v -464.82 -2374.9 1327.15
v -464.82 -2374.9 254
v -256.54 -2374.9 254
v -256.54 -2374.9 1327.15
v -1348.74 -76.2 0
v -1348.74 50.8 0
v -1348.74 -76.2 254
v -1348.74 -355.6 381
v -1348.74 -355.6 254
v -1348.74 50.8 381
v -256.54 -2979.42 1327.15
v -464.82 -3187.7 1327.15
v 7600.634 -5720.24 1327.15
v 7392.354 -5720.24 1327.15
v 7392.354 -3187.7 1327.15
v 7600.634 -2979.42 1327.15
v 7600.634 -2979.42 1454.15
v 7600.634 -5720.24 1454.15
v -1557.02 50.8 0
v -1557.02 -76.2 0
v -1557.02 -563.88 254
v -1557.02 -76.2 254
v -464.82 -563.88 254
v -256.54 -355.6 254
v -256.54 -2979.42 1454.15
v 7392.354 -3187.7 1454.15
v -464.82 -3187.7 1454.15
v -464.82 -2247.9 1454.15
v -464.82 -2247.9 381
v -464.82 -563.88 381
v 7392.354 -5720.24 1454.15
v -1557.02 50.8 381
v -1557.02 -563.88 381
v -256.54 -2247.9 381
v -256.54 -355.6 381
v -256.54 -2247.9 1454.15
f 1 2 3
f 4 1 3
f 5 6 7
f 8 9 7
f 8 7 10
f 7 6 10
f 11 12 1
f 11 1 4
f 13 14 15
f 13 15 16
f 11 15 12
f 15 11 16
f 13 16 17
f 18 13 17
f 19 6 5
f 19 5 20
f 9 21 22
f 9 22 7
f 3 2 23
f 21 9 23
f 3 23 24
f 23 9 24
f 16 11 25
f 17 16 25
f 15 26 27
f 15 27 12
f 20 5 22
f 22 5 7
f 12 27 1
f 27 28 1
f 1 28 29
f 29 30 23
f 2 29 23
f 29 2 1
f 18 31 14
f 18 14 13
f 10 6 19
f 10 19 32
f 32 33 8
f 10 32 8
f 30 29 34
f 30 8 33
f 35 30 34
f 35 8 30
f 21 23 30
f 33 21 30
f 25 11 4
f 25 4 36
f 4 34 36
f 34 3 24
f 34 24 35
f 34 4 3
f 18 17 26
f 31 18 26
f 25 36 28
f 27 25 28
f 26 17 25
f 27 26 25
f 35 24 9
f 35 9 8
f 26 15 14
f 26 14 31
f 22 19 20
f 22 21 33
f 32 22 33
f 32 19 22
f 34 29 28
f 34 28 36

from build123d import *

# Parameters (mm, degrees)
F0_W      = 208.28
F0_H      = 127
F1_DEPTH  = 381
F2_W      = 208.28
F2_H      = 127
F3_DEPTH  = 1524
F4_DEPTH  = 1612.9
F5_W      = 208.28
F5_H      = 127
F6_DEPTH  = 863.6
F7_W      = 127
F7_H      = 208.28
F8_DEPTH  = 7112
F9_DEPTH  = 762
F10_DEPTH = 762
F11_DEPTH = 7112
F12_W     = 208.28
F12_H     = 127
F13_DEPTH = 762
F14_W     = 208.28
F14_H     = 127
F15_DEPTH = 5080
F16_DEPTH = 88.9
F17_DEPTH = 88.9
F18_DEPTH = 120.65
F19_DEPTH = 120.65
F20_DEPTH = 2312.35377
F21_W     = 208.28
F21_H     = 127
F22_DEPTH = 2583.34002
F23_DEPTH = 1557.02
F24_DEPTH = 1557.02
F25_W     = 208.28
F25_H     = 127
F26_DEPTH = 1092.2
F27_W     = 208.28
F27_H     = 127
F28_DEPTH = 1811.02
F29_W     = 208.28
F29_H     = 127
F30_DEPTH = 1073.15
F31_W     = 208.28
F31_H     = 127
F32_DEPTH = 553.72
F33_W     = 208.28
F33_H     = 127
F34_DEPTH = 1811.02
F35_DEPTH = 946.15
F36_DEPTH = 680.72
F37_DEPTH = 1092.2
F38_DEPTH = 76.2
F39_DEPTH = 76.2
F40_DEPTH = 50.8
F41_DEPTH = 50.8


with BuildPart() as f1:
    # F0 (on Top) → F1 (new body)
    with BuildSketch(Plane.XY):
        with Locations((104.14, 63.5)):
            Rectangle(F0_W, F0_H)
    extrude(amount=F1_DEPTH)

    # F2 (on face) → F3 (join)
    with BuildSketch(Plane.XZ):
        with Locations((104.14, 317.5)):
            Rectangle(F2_W, F2_H)
    extrude(amount=F3_DEPTH)

    # F4 (add): a face of the model
    f4_faces = [f1.faces().sort_by_distance(p)[0] for p in [
        (104.14, -1524, 317.5),
    ]]
    extrude(f4_faces, amount=F4_DEPTH)

    # F5 (on face) → F6 (join)
    with BuildSketch(Plane.XY.offset(381)):
        with Locations((104.14, -3073.4)):
            Rectangle(F5_W, F5_H)
    extrude(amount=F6_DEPTH)

    # F7 (on face) → F8 (join)
    with BuildSketch(Plane.YZ.offset(208.28)):
        with Locations((-3073.4, 1140.46)):
            Rectangle(F7_W, F7_H)
    extrude(amount=F8_DEPTH)

    # F9 (add): a face of the model
    f9_faces = [f1.faces().sort_by_distance(p)[0] for p in [
        (3367.9591082803, -3009.9, 1104.9808917197),
    ]]
    extrude(f9_faces, amount=F9_DEPTH)

    # F10 (cut): a face of the model
    f10_faces = [f1.faces().sort_by_distance(p)[0] for p in [
        (3316.8020689655, -3136.9, 1092.6379310345),
    ]]
    extrude(f10_faces, amount=-F10_DEPTH, mode=Mode.SUBTRACT)

    # F11 (cut, through all): a face of the model
    f11_faces = [f1.faces().sort_by_distance(p)[0] for p in [
        (7320.28, -2311.4, 1140.46),
    ]]
    extrude(f11_faces, amount=-F11_DEPTH, mode=Mode.SUBTRACT)

    # F12 (on face) → F13 (join)
    with BuildSketch(Plane.XZ.offset(2374.9)):
        with Locations((104.14, 1181.1)):
            Rectangle(F12_W, F12_H)
    extrude(amount=F13_DEPTH)

    # F14 (on face) → F15 (join)
    with BuildSketch(Plane.YZ.offset(208.28)):
        with Locations((-3032.76, 1181.1)):
            Rectangle(F14_W, F14_H)
    extrude(amount=F15_DEPTH)

    # F16 (add): a face of the model
    f16_faces = [f1.faces().sort_by_distance(p)[0] for p in [
        (2354.4719148936, -2982.0680851064, 1244.6),
    ]]
    extrude(f16_faces, amount=F16_DEPTH)

    # F17 (cut): a face of the model
    f17_faces = [f1.faces().sort_by_distance(p)[0] for p in [
        (2403.392173913, -2996.647826087, 1117.6),
    ]]
    extrude(f17_faces, amount=-F17_DEPTH, mode=Mode.SUBTRACT)

    # F18 (add): a face of the model
    f18_faces = [f1.faces().sort_by_distance(p)[0] for p in [
        (2354.4719148936, -2982.0680851064, 1333.5),
    ]]
    extrude(f18_faces, amount=F18_DEPTH)

    # F19 (cut): a face of the model
    f19_faces = [f1.faces().sort_by_distance(p)[0] for p in [
        (2403.392173913, -2996.647826087, 1206.5),
    ]]
    extrude(f19_faces, amount=-F19_DEPTH, mode=Mode.SUBTRACT)

    # F20 (add): a face of the model
    f20_faces = [f1.faces().sort_by_distance(p)[0] for p in [
        (5288.28, -3032.76, 1390.65),
    ]]
    extrude(f20_faces, amount=F20_DEPTH)

    # F21 (on face) → F22 (join)
    with BuildSketch(Plane.XZ.offset(3136.9)):
        with Locations((7496.49377, 1390.65)):
            Rectangle(F21_W, F21_H)
    extrude(amount=F22_DEPTH)

    # F23 (add): a face of the model
    f23_faces = [f1.faces().sort_by_distance(p)[0] for p in [
        (0, 63.5, 35.7317721818),
    ]]
    extrude(f23_faces, amount=F23_DEPTH)

    # F24 (cut): a face of the model
    f24_faces = [f1.faces().sort_by_distance(p)[0] for p in [
        (208.28, 63.5, 33.8398667357),
    ]]
    extrude(f24_faces, amount=-F24_DEPTH, mode=Mode.SUBTRACT)

    # F25 (on face) → F26 (join)
    with BuildSketch(Plane.YZ.offset(-1348.74)):
        with Locations((-459.74, 317.5)):
            Rectangle(F25_W, F25_H)
    extrude(amount=F26_DEPTH)

    # F27 (on face) → F28 (join, through all)
    with BuildSketch(Plane.XZ.offset(563.88)):
        with Locations((-360.68, 317.5)):
            Rectangle(F27_W, F27_H)
    extrude(amount=F28_DEPTH)

    # F29 (on face) → F30 (join, through all)
    with BuildSketch(Plane.XY.offset(381)):
        with Locations((-360.68, -2311.4)):
            Rectangle(F29_W, F29_H)
    extrude(amount=F30_DEPTH)

    # F31 (on face) → F32 (join, through all)
    with BuildSketch(Plane.XZ.offset(2374.9)):
        with Locations((-360.68, 1390.65)):
            Rectangle(F31_W, F31_H)
    extrude(amount=F32_DEPTH)

    # F33 (on face) → F34 (cut, through all)
    with BuildSketch(Plane.XZ.offset(2374.9)):
        with Locations((-1452.88, 317.5)):
            Rectangle(F33_W, F33_H)
    extrude(amount=-F34_DEPTH, mode=Mode.SUBTRACT)

    # F35 (cut, through all): a face of the model
    f35_faces = [f1.faces().sort_by_distance(p)[0] for p in [
        (-1452.88, -2311.4, 381),
    ]]
    extrude(f35_faces, amount=-F35_DEPTH, mode=Mode.SUBTRACT)

    # F36 (cut, through all): a face of the model
    f36_faces = [f1.faces().sort_by_distance(p)[0] for p in [
        (-1452.88, -2247.9, 1390.65),
    ]]
    extrude(f36_faces, amount=-F36_DEPTH, mode=Mode.SUBTRACT)

    # F37 (cut, through all): a face of the model
    f37_faces = [f1.faces().sort_by_distance(p)[0] for p in [
        (-1557.02, -3032.76, 1390.65),
    ]]
    extrude(f37_faces, amount=-F37_DEPTH, mode=Mode.SUBTRACT)

    # F38 (add): a face of the model
    f38_faces = [f1.faces().sort_by_distance(p)[0] for p in [
        (-1452.88, 0, 127),
    ]]
    extrude(f38_faces, amount=F38_DEPTH)

    # F39 (cut): a face of the model
    f39_faces = [f1.faces().sort_by_distance(p)[0] for p in [
        (-1452.88, 127, 190.5),
    ]]
    extrude(f39_faces, amount=-F39_DEPTH, mode=Mode.SUBTRACT)

    # F40 (add): a face of the model
    f40_faces = [f1.faces().sort_by_distance(p)[0] for p in [
        (3463.766885, -3136.9, 1390.65),
    ]]
    extrude(f40_faces, amount=F40_DEPTH)

    # F41 (cut): a face of the model
    f41_faces = [f1.faces().sort_by_distance(p)[0] for p in [
        (3672.046885, -2928.62, 1390.65),
    ]]
    extrude(f41_faces, amount=-F41_DEPTH, mode=Mode.SUBTRACT)


solid = f1.part
